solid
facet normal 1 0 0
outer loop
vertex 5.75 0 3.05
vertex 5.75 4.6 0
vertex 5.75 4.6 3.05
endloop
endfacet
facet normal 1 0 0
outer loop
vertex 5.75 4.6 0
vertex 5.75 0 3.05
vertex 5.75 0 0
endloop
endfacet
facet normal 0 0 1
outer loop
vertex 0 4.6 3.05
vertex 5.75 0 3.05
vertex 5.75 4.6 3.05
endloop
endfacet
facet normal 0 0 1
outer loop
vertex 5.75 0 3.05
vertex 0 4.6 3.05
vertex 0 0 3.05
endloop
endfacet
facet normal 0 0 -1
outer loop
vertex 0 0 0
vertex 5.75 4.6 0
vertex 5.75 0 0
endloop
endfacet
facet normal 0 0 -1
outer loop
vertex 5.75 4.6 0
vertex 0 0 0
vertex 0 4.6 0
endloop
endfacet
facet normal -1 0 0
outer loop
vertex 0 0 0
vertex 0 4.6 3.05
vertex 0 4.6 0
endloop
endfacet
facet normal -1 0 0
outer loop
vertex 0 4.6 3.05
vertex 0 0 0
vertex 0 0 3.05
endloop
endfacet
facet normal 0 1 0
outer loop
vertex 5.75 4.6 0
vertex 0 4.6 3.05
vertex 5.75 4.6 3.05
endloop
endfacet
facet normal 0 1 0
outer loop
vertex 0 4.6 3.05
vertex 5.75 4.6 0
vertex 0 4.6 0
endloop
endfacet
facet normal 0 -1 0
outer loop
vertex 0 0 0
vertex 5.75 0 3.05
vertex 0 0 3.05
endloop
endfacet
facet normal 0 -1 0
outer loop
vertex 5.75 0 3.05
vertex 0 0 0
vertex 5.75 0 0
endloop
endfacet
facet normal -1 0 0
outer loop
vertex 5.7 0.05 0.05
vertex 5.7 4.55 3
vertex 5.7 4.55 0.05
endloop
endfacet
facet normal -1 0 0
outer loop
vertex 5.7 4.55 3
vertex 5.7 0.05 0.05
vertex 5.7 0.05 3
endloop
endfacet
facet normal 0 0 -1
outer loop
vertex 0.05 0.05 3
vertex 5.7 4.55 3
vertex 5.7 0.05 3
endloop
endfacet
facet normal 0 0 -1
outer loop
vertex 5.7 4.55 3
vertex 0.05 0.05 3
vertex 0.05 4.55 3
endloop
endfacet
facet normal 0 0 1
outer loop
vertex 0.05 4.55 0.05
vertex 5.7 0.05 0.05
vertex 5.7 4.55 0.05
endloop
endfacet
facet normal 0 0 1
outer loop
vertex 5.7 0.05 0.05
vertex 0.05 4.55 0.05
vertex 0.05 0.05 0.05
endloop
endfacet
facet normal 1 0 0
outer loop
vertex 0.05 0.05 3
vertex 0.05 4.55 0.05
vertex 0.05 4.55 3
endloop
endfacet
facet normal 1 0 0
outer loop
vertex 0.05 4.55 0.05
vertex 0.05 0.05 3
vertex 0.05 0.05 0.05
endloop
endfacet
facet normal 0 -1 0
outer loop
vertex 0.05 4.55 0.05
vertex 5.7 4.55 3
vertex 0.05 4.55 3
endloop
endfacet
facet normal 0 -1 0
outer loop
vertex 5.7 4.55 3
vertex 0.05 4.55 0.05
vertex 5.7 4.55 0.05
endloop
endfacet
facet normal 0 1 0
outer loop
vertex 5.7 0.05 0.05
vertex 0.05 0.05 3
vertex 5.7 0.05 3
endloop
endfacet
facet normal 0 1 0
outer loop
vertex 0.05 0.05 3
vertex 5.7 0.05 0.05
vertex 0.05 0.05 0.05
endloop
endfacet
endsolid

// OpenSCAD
$fn=100;
//include <MCAD\regular_shapes.scad>

					/////PARAMETERS\\\\\
ceilings = true;
room_x = 5.7;
room_y = 4.55;
room_z = 3;
wall_t = 0.05;
					 /////MODEL\\\\
room(room_x,room_y,room_z);

					/////MODULES\\\\\

module room(x,y,z){
	difference(){
    	cube([x+wall_t,y+wall_t,z+wall_t]);
			if(ceilings){
				translate([wall_t,wall_t,wall_t]) cube([x-wall_t,y-wall_t,z-wall_t]);
			}
			else{
				translate([wall_t,wall_t,wall_t]) cube([x-wall_t,y-wall_t,z+wall_t]);
			}
	}
}
